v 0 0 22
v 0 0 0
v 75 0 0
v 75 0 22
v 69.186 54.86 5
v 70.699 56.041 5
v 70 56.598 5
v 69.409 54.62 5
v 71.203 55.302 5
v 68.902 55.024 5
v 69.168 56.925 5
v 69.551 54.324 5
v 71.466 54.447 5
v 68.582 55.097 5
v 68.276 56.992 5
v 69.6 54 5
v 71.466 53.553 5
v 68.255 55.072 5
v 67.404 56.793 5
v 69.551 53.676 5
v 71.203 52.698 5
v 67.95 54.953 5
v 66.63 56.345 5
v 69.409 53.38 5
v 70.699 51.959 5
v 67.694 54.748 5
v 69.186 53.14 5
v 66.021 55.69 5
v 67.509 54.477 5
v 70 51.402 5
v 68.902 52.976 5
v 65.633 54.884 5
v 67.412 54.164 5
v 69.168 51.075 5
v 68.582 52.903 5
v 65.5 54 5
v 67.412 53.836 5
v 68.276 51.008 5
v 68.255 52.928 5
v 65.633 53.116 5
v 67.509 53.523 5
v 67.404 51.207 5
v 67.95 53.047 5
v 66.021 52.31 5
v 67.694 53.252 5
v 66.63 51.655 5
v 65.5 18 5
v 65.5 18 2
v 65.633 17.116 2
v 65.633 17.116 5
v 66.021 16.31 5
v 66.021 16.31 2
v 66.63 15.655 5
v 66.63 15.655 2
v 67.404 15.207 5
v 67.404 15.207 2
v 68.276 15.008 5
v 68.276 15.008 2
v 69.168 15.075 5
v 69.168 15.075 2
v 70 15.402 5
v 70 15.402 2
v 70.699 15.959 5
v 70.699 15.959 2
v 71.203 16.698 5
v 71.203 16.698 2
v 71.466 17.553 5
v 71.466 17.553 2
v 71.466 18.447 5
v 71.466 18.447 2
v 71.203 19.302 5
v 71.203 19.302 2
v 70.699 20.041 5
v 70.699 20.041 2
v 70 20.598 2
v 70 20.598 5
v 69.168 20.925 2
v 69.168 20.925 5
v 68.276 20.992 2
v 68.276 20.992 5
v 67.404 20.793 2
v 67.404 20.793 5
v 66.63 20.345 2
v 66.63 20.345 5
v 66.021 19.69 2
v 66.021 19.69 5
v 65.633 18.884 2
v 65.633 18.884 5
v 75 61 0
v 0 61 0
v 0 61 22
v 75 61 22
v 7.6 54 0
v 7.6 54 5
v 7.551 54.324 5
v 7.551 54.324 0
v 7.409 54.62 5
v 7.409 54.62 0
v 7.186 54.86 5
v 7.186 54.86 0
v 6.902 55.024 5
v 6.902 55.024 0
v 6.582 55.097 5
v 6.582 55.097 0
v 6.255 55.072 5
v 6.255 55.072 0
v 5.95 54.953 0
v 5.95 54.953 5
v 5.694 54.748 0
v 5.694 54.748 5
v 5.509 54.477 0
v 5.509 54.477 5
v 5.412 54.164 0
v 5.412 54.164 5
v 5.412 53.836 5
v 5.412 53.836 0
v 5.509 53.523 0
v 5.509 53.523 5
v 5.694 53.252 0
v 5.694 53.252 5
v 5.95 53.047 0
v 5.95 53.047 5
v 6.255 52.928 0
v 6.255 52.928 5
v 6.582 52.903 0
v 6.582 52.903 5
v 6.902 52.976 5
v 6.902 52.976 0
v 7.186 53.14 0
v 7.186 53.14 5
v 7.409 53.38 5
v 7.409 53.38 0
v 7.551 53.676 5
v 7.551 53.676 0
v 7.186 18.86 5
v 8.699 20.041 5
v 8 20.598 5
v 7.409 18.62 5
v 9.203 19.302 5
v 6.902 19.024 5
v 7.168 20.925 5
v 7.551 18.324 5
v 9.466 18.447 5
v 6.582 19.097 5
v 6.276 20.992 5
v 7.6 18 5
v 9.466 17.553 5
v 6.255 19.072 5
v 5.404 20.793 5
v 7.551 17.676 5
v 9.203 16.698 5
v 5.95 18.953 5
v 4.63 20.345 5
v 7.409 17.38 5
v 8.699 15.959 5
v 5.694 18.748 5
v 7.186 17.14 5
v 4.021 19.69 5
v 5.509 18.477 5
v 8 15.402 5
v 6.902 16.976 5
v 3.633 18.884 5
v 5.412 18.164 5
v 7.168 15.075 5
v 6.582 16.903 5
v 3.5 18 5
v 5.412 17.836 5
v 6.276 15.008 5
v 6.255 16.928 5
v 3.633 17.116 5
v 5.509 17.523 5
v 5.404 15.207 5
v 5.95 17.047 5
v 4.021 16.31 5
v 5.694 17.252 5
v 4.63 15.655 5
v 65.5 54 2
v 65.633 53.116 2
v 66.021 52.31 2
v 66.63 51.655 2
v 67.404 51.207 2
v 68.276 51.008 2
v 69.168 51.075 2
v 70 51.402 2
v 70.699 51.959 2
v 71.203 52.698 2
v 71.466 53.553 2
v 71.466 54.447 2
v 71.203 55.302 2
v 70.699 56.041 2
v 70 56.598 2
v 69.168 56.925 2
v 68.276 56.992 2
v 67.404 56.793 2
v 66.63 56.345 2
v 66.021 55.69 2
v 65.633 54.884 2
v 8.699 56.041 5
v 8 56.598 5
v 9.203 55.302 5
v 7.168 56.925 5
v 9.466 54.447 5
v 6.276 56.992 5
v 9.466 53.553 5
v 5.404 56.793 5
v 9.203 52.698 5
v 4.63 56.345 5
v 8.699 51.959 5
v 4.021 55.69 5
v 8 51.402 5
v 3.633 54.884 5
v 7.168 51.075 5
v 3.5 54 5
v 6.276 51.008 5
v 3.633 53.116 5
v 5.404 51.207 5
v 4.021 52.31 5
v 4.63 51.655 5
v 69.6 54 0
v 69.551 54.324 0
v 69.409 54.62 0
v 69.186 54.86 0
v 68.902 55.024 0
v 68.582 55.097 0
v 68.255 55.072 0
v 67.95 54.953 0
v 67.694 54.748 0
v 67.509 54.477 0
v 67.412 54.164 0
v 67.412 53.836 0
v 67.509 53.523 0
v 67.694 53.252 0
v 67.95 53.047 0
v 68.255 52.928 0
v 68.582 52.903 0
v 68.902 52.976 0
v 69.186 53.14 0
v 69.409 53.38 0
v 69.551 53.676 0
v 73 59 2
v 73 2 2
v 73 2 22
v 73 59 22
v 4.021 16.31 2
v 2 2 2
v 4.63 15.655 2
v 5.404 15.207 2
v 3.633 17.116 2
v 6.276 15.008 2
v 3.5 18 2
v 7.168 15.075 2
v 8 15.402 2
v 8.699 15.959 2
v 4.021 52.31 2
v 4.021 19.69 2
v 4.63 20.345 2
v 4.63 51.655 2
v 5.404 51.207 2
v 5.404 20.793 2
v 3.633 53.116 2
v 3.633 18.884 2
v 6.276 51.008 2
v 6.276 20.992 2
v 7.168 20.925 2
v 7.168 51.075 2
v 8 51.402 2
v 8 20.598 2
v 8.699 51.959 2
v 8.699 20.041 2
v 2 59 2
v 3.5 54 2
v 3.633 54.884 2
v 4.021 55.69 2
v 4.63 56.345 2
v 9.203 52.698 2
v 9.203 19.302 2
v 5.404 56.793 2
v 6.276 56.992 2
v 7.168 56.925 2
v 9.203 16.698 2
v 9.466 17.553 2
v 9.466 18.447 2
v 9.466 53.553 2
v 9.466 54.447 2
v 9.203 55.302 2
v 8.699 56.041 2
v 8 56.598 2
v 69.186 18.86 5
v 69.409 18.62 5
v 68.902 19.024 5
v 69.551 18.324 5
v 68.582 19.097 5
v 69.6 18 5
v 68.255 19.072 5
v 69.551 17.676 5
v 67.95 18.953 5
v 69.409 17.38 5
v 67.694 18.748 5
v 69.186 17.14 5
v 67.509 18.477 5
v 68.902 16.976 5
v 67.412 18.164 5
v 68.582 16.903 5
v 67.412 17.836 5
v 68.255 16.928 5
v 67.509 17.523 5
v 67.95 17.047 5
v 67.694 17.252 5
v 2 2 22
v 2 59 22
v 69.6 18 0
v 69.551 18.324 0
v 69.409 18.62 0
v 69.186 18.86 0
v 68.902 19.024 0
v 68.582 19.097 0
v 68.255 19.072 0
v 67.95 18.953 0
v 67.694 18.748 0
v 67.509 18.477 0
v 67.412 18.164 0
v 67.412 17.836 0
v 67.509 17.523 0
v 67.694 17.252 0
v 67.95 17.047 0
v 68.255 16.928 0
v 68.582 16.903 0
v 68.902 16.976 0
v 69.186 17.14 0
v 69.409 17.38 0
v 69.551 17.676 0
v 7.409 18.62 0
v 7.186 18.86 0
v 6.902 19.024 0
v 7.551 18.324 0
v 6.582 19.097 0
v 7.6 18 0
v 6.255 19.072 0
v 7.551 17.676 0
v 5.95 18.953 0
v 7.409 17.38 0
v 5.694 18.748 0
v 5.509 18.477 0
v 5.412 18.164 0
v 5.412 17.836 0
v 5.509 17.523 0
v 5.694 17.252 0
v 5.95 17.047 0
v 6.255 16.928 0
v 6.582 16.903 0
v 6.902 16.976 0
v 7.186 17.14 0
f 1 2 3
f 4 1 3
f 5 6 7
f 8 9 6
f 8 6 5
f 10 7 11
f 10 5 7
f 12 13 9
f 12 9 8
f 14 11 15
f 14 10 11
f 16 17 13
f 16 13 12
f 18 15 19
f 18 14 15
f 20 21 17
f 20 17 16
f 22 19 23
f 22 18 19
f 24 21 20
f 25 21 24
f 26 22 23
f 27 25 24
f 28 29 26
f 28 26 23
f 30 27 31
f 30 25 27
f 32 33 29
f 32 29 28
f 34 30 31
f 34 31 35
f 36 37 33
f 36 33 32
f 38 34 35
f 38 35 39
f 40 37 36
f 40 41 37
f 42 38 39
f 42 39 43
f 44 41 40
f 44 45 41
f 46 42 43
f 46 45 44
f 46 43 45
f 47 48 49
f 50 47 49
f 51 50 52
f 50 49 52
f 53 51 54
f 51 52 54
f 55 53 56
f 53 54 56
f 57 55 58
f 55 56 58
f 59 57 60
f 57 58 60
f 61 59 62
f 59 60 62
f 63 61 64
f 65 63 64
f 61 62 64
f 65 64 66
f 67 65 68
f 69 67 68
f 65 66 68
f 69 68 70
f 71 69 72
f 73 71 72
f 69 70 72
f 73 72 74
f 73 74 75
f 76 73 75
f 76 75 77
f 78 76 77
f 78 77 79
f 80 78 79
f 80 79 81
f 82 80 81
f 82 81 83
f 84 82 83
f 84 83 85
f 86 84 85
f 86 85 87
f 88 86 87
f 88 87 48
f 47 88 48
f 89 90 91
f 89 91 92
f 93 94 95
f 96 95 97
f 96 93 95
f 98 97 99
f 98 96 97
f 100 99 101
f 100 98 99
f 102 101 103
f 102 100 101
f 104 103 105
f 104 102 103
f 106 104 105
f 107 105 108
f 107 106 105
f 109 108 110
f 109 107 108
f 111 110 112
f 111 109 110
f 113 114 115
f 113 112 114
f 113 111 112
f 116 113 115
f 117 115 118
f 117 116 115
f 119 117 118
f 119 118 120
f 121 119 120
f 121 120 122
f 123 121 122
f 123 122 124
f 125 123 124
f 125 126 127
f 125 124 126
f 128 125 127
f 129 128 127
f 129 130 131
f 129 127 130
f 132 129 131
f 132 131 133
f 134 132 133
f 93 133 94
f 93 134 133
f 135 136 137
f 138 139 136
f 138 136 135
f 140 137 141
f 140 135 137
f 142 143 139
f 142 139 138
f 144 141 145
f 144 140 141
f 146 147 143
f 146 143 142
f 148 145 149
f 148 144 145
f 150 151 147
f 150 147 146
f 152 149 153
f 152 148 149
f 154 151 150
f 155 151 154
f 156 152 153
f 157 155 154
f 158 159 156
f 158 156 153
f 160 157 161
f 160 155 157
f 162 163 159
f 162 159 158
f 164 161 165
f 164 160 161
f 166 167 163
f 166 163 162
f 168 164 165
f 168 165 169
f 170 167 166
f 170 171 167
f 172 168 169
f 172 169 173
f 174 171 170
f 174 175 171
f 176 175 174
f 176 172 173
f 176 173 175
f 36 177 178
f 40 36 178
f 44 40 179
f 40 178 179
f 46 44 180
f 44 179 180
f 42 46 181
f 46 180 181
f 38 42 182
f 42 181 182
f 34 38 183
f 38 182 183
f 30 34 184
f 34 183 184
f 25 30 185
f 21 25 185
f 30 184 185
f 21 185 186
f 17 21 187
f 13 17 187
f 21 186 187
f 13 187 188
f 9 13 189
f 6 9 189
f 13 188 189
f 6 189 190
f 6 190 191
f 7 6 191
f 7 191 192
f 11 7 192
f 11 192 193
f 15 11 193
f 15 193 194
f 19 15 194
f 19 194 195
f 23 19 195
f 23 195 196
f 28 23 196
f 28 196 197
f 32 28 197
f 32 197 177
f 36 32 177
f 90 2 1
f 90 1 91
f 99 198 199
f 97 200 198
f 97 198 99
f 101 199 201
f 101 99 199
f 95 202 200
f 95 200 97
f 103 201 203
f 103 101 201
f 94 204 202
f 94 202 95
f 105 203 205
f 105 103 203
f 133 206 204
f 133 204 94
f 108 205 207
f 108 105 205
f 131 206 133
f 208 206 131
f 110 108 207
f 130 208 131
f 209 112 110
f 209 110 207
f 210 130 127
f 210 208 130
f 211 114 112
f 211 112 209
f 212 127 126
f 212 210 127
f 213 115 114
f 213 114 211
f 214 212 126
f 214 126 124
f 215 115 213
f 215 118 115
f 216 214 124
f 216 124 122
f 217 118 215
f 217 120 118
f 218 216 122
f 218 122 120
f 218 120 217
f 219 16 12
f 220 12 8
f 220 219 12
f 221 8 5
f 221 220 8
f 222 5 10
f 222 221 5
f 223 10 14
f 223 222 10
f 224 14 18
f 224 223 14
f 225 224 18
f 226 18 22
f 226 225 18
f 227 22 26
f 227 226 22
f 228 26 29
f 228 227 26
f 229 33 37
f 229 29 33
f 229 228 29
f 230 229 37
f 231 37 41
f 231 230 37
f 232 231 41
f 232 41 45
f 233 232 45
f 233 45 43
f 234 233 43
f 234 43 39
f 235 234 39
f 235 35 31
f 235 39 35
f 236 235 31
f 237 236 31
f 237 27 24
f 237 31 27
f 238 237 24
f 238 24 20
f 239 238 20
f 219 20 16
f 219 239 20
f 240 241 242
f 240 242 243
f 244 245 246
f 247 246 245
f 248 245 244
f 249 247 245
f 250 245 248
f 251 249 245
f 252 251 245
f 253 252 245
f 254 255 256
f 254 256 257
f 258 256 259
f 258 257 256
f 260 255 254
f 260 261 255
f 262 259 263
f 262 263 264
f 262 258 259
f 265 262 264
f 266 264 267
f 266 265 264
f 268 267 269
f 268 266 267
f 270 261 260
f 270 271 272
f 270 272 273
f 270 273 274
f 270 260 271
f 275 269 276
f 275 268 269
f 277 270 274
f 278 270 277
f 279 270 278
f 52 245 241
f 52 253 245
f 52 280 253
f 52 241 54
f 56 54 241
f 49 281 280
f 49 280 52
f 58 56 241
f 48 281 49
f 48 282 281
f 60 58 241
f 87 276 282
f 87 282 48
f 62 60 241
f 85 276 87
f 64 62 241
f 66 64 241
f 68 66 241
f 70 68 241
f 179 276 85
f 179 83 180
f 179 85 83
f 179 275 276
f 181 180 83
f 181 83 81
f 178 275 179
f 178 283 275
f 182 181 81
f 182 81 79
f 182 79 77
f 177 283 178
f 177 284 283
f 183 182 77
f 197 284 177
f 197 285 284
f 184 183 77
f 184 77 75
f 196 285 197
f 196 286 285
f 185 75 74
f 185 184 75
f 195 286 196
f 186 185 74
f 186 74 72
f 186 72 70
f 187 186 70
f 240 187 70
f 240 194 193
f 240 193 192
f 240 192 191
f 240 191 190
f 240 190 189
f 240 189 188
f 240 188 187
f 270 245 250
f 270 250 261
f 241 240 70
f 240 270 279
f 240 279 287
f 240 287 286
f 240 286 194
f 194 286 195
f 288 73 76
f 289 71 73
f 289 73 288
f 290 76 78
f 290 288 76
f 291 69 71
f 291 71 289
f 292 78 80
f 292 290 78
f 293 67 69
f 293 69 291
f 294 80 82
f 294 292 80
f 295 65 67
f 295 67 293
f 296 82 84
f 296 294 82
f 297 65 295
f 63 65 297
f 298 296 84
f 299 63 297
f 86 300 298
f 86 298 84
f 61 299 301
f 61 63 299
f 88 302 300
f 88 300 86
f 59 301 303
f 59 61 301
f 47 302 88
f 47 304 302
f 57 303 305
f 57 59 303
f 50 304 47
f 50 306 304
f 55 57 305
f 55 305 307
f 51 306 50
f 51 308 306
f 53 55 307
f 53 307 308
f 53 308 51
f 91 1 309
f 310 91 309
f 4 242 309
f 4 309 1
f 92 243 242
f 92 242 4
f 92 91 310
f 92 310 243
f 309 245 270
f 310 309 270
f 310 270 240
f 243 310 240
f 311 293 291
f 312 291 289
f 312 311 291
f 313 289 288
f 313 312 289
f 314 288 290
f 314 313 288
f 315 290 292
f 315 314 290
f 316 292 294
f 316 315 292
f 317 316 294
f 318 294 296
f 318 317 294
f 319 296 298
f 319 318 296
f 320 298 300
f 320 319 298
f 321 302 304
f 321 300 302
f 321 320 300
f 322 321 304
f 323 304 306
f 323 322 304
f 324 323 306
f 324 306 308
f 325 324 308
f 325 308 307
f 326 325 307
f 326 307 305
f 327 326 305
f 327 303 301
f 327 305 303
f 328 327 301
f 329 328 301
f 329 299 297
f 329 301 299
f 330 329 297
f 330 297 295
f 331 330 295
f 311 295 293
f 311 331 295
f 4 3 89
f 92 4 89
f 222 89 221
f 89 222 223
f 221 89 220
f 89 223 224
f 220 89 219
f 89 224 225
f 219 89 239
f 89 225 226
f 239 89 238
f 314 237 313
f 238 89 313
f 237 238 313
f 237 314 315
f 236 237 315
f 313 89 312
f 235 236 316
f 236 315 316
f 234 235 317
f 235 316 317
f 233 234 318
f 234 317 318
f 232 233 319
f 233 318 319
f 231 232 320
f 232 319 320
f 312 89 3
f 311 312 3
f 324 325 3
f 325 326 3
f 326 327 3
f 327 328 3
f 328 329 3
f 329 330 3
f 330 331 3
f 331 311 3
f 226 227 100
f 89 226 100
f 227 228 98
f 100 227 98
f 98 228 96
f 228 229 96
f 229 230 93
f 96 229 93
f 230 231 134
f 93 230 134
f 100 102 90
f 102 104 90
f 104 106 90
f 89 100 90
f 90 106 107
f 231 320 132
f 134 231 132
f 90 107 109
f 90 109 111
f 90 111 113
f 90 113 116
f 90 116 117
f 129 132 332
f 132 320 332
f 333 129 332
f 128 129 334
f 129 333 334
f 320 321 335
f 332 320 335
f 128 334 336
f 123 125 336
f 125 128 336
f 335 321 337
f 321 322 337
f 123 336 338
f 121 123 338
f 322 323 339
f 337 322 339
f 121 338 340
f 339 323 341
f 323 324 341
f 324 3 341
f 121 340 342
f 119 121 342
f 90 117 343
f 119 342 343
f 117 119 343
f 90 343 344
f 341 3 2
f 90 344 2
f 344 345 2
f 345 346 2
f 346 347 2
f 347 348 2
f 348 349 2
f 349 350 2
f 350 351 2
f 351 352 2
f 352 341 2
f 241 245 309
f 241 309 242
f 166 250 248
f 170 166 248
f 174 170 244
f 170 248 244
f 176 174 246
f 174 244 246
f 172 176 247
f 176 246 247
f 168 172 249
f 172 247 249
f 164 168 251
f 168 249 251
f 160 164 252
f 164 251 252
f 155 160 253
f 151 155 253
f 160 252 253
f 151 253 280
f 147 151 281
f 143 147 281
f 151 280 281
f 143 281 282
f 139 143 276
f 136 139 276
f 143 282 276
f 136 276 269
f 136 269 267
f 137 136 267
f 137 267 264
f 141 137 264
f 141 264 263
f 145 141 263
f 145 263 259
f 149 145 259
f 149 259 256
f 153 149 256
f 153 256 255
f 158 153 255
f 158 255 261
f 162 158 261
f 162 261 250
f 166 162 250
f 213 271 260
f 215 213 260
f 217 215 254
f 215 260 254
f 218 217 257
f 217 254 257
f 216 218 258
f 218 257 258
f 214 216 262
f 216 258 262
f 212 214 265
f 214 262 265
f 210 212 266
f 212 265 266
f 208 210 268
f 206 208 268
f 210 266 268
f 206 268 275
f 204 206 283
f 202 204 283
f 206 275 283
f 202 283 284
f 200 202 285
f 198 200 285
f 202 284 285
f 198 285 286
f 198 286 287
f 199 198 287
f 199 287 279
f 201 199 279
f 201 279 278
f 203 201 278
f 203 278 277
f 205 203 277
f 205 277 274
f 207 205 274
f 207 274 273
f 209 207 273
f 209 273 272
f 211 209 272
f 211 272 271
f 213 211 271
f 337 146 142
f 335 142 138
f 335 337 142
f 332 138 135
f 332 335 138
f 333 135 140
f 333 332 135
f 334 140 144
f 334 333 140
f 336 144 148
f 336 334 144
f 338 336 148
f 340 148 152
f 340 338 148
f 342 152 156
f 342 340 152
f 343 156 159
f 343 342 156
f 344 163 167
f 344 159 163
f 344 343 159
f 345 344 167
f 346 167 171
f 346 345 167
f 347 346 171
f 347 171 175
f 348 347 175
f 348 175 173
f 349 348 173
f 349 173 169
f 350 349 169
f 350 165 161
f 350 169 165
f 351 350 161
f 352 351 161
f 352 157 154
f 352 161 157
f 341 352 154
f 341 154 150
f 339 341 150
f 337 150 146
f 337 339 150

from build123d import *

# Parameters (mm, degrees)
SKETCH_1_W          = 75
SKETCH_1_H          = 61
EXTRUDE_1_DEPTH     = 22
SKETCH_2_W          = 71
SKETCH_2_H          = 57
CUT_EXTRUDE_1_DEPTH = 100.146356464
SKETCH_3_W          = 75
SKETCH_3_H          = 61
EXTRUDE_2_DEPTH     = 2
SKETCH_4_R          = 3
EXTRUDE_3_DEPTH     = 5
SKETCH_5_R          = 1.1
CUT_EXTRUDE_2_DEPTH = 100.146356464


with BuildPart() as part:
    # 草图1 → 凸台-拉伸1 (new body)
    with BuildSketch(Plane.XY):
        with Locations((37.5, 30.5)):
            Rectangle(SKETCH_1_W, SKETCH_1_H)
    extrude(amount=EXTRUDE_1_DEPTH)

    # 草图2 → 切除-拉伸1 (cut, through all)
    with BuildSketch(Plane.XY):
        with Locations((37.5, 30.5)):
            Rectangle(SKETCH_2_W, SKETCH_2_H)
    extrude(amount=CUT_EXTRUDE_1_DEPTH, mode=Mode.SUBTRACT)

    # 草图3 → 凸台-拉伸2 (add)
    with BuildSketch(Plane.XY):
        with Locations((37.5, 30.5)):
            Rectangle(SKETCH_3_W, SKETCH_3_H)
    extrude(amount=EXTRUDE_2_DEPTH)

    # 草图4 → 凸台-拉伸3 (add)
    with BuildSketch(Plane.XY):
        with Locations(Location((6.5, 18, 0), (0, 0, 180))):
            Circle(SKETCH_4_R)
        with Locations(Location((68.5, 18, 0), (0, 0, 180))):
            Circle(SKETCH_4_R)
        with Locations(Location((6.5, 54, 0), (0, 0, 180))):
            Circle(SKETCH_4_R)
        with Locations(Location((68.5, 54, 0), (0, 0, 180))):
            Circle(SKETCH_4_R)
    extrude(amount=EXTRUDE_3_DEPTH)

    # 草图5 → 切除-拉伸2 (cut, through all)
    with BuildSketch(Plane.XY):
        with Locations((6.5, 18)):
            Circle(SKETCH_5_R)
        with Locations((68.5, 18)):
            Circle(SKETCH_5_R)
        with Locations((6.5, 54)):
            Circle(SKETCH_5_R)
        with Locations((68.5, 54)):
            Circle(SKETCH_5_R)
    extrude(amount=CUT_EXTRUDE_2_DEPTH, mode=Mode.SUBTRACT)


solid = part.part
